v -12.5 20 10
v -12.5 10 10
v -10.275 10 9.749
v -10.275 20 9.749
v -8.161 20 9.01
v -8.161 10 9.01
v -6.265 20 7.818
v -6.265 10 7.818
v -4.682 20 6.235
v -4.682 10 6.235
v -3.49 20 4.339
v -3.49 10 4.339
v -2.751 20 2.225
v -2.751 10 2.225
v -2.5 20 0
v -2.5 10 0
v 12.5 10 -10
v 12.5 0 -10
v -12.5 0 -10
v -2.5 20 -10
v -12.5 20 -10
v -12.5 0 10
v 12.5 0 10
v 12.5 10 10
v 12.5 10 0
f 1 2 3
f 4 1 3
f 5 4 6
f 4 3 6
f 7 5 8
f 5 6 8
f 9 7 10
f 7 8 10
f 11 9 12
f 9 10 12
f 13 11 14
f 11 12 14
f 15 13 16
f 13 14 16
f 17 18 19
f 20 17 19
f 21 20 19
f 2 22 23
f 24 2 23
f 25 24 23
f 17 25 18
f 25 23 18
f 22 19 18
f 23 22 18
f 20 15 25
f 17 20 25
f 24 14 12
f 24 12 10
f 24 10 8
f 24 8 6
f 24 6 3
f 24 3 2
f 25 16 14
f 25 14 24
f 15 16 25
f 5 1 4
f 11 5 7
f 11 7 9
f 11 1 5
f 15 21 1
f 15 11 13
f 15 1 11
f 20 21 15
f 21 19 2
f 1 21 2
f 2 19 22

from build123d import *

# Parameters (mm, degrees)
SKETCH_1_W          = 25
SKETCH_1_H          = 20
EXTRUDE_1_DEPTH     = 10
EXTRUDE_2_DEPTH     = 20
CUT_EXTRUDE_1_DEPTH = 20


with BuildPart() as part:
    # 草圖1 → 填料-伸長1 (new body)
    with BuildSketch(Plane(origin=(0, 0, 0), x_dir=(1, 0, 0), z_dir=(0, 1, 0))):
        Rectangle(SKETCH_1_W, SKETCH_1_H)
    extrude(amount=EXTRUDE_1_DEPTH)

    # 草圖1<3> → 填料-伸長2 (add)
    with BuildSketch(Plane(origin=(0, 0, 0), x_dir=(1, 0, 0), z_dir=(0, 1, 0))):
        with BuildLine():
            Line((-12.5, 10), (-12.5, -10))
            ThreePointArc((-12.5, -10), (-5.428932188, -7.071067812), (-2.5, 0))
            Line((-2.5, 0), (12.5, 0))
            Line((12.5, 0), (12.5, 10))
            Line((12.5, 10), (-12.5, 10))
        make_face()
    extrude(amount=EXTRUDE_2_DEPTH)

    # 草圖2 → 除料-伸長1 (cut)
    with BuildSketch(Plane.XY):
        Polygon((-2.5, 20), (12.5, 10), (12.5, 20), align=None)
    extrude(amount=-CUT_EXTRUDE_1_DEPTH, mode=Mode.SUBTRACT)


solid = part.part
